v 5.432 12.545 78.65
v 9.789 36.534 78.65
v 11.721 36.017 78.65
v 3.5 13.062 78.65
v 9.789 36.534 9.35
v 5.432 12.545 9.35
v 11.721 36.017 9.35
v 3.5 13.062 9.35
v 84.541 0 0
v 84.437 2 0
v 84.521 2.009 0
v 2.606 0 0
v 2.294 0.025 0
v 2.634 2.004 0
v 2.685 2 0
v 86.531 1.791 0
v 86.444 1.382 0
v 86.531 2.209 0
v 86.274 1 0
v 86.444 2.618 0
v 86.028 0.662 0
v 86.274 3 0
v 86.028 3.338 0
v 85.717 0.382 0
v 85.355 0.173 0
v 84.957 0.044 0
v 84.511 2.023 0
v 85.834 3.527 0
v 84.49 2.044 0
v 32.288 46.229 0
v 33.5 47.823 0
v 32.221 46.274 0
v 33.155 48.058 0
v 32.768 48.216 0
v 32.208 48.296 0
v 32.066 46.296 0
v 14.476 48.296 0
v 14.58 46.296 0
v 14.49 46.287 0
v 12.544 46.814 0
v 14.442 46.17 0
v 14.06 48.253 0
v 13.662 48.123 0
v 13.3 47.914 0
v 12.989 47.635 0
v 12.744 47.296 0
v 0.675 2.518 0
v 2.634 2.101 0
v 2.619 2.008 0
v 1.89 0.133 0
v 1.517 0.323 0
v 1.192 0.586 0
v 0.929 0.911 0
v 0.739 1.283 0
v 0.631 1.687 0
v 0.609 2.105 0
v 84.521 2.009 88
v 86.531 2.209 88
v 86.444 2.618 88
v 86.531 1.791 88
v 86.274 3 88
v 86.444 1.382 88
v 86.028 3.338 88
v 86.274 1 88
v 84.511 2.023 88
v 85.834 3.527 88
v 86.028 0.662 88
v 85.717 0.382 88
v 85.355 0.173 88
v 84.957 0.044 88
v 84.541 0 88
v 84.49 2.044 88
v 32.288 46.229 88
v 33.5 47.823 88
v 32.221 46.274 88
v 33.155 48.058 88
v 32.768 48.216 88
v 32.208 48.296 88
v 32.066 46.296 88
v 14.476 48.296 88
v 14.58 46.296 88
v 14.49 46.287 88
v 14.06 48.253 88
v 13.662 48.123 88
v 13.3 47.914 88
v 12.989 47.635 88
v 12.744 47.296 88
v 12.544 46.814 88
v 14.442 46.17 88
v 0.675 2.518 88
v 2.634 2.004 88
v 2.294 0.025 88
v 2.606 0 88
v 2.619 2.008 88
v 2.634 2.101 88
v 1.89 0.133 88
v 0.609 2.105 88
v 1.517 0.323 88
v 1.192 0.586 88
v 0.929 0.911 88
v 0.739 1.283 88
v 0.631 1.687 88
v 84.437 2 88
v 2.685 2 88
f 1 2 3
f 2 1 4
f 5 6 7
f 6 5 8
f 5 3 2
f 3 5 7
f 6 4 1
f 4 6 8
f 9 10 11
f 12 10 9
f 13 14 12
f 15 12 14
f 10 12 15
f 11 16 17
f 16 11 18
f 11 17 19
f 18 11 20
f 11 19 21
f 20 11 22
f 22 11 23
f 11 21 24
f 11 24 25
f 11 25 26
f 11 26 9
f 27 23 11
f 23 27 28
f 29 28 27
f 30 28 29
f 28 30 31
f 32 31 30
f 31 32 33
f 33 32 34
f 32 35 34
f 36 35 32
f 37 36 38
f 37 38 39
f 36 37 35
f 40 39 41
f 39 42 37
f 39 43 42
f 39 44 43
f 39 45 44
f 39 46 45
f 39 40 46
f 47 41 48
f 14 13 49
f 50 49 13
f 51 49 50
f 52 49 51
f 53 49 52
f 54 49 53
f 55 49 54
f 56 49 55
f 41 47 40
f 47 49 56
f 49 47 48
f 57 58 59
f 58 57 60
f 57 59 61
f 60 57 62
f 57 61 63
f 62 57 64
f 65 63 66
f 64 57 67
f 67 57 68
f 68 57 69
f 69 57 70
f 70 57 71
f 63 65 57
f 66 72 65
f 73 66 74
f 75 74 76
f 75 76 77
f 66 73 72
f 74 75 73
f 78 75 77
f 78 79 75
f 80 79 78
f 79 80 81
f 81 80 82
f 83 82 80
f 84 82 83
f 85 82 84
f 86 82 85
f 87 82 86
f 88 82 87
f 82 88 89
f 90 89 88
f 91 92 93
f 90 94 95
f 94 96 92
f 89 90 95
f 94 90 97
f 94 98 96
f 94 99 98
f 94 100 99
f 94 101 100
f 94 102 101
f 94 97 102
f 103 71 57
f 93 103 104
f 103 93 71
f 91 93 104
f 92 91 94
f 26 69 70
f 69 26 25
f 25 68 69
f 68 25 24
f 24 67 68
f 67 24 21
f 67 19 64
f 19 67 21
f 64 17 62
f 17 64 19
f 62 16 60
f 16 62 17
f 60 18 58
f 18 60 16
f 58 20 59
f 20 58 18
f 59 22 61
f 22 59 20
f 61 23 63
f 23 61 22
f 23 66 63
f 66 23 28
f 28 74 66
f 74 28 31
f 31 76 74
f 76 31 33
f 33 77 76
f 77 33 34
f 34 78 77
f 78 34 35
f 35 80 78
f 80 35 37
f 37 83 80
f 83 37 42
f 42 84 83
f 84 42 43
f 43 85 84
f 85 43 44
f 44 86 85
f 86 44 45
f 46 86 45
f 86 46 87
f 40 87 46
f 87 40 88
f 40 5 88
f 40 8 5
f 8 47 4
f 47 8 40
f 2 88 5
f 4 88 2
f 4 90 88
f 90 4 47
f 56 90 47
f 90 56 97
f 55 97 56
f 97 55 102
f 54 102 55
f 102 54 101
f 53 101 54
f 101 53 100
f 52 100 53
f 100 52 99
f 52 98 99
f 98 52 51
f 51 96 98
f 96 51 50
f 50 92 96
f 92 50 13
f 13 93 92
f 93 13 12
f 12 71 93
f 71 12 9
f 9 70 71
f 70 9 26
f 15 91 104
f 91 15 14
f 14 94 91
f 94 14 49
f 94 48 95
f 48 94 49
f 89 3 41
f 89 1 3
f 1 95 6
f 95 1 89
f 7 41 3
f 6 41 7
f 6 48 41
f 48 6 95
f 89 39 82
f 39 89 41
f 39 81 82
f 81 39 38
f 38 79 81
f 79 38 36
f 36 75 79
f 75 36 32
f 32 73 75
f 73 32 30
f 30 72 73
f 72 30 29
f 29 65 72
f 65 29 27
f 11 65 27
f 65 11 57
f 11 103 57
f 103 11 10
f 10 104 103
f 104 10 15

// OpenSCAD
// 2x16 character LCD sitting in front of a "half length" protoboard
// originally used for the climate_display prototype

// design questions
// 1. what angle should the LCD be for optimal desktop and shelftop viewing?
// 2. how much clearance should remain for a potential battery?
// 

front_face_width = 88;
depth = 90; // foot print depth
front_face_height = 50;
front_face_tilt = 15; // degrees from vertical
hull_thickness = 2;
top_depth = 20; // the depth of the flat surface on top
lcd_bottom = 14; // how far from the bottom of the front face the LCD cutout sits

module side_profile() {
  points =[
    [0,0], 
    [depth, 0],
    [sin(front_face_tilt)*front_face_height+top_depth, cos(front_face_tilt)*front_face_height],
    [sin(front_face_tilt)*front_face_height, cos(front_face_tilt)*front_face_height],
  ];

  $fs = 0.01;
  offset(r = hull_thickness)
  offset(delta = -hull_thickness, chamfer=false)
  polygon(points = (points), convexity = 10);
}

module side_profile_hollow() {
  difference() {
    side_profile();
    offset(r = -hull_thickness)
      side_profile();
  }
}

module screen_cutout() {
  lcd_height = 24.3;
  lcd_width = 69.3;
  lcd_screen_depth = 6.86;
  lcd_pcb_height = 36;
  lcd_pcb_width = 80.5;
  lcd_left = (front_face_width - lcd_width) / 2; // how far from the left side of the front face the LCD cutout sits
  cutout_depth = 21;
  color("green")
  rotate([0,0, -front_face_tilt])
  translate([sin(front_face_tilt)*-0.1, cos(front_face_tilt)*lcd_bottom, lcd_left]) {
    // the screen module itself
    cube( size = [lcd_screen_depth, lcd_height, lcd_width], center = false);
    // the LCD's PCB
    translate([lcd_screen_depth, -5, -5.19])
      cube(size = [1, lcd_pcb_height, lcd_pcb_width], center = false);
    // the LCD backpack
    translate([lcd_screen_depth+1, 8.8, -5.19])
      cube(size = [8.7, 22.24, 50.3] );
    // the large screw terminals on the LCD backpack
    translate([lcd_screen_depth+1+8.7, 14.13-5, -5.19])
      cube([5.44, 6.84, 18], center=false);
  }
}

module short_protoboard() {
  color("yellow")
  translate([12, hull_thickness, hull_thickness]){
    // the protoboard itself
    cube([56.6, 9.7, 84]);
    // the stack of modules in the center
    translate([20, 9.7, 15])
      cube([16, 17, 43]); 
  }
}


difference() {
  linear_extrude(height = front_face_width)
    side_profile_hollow();
  screen_cutout();
}

%screen_cutout();
%short_protoboard();
